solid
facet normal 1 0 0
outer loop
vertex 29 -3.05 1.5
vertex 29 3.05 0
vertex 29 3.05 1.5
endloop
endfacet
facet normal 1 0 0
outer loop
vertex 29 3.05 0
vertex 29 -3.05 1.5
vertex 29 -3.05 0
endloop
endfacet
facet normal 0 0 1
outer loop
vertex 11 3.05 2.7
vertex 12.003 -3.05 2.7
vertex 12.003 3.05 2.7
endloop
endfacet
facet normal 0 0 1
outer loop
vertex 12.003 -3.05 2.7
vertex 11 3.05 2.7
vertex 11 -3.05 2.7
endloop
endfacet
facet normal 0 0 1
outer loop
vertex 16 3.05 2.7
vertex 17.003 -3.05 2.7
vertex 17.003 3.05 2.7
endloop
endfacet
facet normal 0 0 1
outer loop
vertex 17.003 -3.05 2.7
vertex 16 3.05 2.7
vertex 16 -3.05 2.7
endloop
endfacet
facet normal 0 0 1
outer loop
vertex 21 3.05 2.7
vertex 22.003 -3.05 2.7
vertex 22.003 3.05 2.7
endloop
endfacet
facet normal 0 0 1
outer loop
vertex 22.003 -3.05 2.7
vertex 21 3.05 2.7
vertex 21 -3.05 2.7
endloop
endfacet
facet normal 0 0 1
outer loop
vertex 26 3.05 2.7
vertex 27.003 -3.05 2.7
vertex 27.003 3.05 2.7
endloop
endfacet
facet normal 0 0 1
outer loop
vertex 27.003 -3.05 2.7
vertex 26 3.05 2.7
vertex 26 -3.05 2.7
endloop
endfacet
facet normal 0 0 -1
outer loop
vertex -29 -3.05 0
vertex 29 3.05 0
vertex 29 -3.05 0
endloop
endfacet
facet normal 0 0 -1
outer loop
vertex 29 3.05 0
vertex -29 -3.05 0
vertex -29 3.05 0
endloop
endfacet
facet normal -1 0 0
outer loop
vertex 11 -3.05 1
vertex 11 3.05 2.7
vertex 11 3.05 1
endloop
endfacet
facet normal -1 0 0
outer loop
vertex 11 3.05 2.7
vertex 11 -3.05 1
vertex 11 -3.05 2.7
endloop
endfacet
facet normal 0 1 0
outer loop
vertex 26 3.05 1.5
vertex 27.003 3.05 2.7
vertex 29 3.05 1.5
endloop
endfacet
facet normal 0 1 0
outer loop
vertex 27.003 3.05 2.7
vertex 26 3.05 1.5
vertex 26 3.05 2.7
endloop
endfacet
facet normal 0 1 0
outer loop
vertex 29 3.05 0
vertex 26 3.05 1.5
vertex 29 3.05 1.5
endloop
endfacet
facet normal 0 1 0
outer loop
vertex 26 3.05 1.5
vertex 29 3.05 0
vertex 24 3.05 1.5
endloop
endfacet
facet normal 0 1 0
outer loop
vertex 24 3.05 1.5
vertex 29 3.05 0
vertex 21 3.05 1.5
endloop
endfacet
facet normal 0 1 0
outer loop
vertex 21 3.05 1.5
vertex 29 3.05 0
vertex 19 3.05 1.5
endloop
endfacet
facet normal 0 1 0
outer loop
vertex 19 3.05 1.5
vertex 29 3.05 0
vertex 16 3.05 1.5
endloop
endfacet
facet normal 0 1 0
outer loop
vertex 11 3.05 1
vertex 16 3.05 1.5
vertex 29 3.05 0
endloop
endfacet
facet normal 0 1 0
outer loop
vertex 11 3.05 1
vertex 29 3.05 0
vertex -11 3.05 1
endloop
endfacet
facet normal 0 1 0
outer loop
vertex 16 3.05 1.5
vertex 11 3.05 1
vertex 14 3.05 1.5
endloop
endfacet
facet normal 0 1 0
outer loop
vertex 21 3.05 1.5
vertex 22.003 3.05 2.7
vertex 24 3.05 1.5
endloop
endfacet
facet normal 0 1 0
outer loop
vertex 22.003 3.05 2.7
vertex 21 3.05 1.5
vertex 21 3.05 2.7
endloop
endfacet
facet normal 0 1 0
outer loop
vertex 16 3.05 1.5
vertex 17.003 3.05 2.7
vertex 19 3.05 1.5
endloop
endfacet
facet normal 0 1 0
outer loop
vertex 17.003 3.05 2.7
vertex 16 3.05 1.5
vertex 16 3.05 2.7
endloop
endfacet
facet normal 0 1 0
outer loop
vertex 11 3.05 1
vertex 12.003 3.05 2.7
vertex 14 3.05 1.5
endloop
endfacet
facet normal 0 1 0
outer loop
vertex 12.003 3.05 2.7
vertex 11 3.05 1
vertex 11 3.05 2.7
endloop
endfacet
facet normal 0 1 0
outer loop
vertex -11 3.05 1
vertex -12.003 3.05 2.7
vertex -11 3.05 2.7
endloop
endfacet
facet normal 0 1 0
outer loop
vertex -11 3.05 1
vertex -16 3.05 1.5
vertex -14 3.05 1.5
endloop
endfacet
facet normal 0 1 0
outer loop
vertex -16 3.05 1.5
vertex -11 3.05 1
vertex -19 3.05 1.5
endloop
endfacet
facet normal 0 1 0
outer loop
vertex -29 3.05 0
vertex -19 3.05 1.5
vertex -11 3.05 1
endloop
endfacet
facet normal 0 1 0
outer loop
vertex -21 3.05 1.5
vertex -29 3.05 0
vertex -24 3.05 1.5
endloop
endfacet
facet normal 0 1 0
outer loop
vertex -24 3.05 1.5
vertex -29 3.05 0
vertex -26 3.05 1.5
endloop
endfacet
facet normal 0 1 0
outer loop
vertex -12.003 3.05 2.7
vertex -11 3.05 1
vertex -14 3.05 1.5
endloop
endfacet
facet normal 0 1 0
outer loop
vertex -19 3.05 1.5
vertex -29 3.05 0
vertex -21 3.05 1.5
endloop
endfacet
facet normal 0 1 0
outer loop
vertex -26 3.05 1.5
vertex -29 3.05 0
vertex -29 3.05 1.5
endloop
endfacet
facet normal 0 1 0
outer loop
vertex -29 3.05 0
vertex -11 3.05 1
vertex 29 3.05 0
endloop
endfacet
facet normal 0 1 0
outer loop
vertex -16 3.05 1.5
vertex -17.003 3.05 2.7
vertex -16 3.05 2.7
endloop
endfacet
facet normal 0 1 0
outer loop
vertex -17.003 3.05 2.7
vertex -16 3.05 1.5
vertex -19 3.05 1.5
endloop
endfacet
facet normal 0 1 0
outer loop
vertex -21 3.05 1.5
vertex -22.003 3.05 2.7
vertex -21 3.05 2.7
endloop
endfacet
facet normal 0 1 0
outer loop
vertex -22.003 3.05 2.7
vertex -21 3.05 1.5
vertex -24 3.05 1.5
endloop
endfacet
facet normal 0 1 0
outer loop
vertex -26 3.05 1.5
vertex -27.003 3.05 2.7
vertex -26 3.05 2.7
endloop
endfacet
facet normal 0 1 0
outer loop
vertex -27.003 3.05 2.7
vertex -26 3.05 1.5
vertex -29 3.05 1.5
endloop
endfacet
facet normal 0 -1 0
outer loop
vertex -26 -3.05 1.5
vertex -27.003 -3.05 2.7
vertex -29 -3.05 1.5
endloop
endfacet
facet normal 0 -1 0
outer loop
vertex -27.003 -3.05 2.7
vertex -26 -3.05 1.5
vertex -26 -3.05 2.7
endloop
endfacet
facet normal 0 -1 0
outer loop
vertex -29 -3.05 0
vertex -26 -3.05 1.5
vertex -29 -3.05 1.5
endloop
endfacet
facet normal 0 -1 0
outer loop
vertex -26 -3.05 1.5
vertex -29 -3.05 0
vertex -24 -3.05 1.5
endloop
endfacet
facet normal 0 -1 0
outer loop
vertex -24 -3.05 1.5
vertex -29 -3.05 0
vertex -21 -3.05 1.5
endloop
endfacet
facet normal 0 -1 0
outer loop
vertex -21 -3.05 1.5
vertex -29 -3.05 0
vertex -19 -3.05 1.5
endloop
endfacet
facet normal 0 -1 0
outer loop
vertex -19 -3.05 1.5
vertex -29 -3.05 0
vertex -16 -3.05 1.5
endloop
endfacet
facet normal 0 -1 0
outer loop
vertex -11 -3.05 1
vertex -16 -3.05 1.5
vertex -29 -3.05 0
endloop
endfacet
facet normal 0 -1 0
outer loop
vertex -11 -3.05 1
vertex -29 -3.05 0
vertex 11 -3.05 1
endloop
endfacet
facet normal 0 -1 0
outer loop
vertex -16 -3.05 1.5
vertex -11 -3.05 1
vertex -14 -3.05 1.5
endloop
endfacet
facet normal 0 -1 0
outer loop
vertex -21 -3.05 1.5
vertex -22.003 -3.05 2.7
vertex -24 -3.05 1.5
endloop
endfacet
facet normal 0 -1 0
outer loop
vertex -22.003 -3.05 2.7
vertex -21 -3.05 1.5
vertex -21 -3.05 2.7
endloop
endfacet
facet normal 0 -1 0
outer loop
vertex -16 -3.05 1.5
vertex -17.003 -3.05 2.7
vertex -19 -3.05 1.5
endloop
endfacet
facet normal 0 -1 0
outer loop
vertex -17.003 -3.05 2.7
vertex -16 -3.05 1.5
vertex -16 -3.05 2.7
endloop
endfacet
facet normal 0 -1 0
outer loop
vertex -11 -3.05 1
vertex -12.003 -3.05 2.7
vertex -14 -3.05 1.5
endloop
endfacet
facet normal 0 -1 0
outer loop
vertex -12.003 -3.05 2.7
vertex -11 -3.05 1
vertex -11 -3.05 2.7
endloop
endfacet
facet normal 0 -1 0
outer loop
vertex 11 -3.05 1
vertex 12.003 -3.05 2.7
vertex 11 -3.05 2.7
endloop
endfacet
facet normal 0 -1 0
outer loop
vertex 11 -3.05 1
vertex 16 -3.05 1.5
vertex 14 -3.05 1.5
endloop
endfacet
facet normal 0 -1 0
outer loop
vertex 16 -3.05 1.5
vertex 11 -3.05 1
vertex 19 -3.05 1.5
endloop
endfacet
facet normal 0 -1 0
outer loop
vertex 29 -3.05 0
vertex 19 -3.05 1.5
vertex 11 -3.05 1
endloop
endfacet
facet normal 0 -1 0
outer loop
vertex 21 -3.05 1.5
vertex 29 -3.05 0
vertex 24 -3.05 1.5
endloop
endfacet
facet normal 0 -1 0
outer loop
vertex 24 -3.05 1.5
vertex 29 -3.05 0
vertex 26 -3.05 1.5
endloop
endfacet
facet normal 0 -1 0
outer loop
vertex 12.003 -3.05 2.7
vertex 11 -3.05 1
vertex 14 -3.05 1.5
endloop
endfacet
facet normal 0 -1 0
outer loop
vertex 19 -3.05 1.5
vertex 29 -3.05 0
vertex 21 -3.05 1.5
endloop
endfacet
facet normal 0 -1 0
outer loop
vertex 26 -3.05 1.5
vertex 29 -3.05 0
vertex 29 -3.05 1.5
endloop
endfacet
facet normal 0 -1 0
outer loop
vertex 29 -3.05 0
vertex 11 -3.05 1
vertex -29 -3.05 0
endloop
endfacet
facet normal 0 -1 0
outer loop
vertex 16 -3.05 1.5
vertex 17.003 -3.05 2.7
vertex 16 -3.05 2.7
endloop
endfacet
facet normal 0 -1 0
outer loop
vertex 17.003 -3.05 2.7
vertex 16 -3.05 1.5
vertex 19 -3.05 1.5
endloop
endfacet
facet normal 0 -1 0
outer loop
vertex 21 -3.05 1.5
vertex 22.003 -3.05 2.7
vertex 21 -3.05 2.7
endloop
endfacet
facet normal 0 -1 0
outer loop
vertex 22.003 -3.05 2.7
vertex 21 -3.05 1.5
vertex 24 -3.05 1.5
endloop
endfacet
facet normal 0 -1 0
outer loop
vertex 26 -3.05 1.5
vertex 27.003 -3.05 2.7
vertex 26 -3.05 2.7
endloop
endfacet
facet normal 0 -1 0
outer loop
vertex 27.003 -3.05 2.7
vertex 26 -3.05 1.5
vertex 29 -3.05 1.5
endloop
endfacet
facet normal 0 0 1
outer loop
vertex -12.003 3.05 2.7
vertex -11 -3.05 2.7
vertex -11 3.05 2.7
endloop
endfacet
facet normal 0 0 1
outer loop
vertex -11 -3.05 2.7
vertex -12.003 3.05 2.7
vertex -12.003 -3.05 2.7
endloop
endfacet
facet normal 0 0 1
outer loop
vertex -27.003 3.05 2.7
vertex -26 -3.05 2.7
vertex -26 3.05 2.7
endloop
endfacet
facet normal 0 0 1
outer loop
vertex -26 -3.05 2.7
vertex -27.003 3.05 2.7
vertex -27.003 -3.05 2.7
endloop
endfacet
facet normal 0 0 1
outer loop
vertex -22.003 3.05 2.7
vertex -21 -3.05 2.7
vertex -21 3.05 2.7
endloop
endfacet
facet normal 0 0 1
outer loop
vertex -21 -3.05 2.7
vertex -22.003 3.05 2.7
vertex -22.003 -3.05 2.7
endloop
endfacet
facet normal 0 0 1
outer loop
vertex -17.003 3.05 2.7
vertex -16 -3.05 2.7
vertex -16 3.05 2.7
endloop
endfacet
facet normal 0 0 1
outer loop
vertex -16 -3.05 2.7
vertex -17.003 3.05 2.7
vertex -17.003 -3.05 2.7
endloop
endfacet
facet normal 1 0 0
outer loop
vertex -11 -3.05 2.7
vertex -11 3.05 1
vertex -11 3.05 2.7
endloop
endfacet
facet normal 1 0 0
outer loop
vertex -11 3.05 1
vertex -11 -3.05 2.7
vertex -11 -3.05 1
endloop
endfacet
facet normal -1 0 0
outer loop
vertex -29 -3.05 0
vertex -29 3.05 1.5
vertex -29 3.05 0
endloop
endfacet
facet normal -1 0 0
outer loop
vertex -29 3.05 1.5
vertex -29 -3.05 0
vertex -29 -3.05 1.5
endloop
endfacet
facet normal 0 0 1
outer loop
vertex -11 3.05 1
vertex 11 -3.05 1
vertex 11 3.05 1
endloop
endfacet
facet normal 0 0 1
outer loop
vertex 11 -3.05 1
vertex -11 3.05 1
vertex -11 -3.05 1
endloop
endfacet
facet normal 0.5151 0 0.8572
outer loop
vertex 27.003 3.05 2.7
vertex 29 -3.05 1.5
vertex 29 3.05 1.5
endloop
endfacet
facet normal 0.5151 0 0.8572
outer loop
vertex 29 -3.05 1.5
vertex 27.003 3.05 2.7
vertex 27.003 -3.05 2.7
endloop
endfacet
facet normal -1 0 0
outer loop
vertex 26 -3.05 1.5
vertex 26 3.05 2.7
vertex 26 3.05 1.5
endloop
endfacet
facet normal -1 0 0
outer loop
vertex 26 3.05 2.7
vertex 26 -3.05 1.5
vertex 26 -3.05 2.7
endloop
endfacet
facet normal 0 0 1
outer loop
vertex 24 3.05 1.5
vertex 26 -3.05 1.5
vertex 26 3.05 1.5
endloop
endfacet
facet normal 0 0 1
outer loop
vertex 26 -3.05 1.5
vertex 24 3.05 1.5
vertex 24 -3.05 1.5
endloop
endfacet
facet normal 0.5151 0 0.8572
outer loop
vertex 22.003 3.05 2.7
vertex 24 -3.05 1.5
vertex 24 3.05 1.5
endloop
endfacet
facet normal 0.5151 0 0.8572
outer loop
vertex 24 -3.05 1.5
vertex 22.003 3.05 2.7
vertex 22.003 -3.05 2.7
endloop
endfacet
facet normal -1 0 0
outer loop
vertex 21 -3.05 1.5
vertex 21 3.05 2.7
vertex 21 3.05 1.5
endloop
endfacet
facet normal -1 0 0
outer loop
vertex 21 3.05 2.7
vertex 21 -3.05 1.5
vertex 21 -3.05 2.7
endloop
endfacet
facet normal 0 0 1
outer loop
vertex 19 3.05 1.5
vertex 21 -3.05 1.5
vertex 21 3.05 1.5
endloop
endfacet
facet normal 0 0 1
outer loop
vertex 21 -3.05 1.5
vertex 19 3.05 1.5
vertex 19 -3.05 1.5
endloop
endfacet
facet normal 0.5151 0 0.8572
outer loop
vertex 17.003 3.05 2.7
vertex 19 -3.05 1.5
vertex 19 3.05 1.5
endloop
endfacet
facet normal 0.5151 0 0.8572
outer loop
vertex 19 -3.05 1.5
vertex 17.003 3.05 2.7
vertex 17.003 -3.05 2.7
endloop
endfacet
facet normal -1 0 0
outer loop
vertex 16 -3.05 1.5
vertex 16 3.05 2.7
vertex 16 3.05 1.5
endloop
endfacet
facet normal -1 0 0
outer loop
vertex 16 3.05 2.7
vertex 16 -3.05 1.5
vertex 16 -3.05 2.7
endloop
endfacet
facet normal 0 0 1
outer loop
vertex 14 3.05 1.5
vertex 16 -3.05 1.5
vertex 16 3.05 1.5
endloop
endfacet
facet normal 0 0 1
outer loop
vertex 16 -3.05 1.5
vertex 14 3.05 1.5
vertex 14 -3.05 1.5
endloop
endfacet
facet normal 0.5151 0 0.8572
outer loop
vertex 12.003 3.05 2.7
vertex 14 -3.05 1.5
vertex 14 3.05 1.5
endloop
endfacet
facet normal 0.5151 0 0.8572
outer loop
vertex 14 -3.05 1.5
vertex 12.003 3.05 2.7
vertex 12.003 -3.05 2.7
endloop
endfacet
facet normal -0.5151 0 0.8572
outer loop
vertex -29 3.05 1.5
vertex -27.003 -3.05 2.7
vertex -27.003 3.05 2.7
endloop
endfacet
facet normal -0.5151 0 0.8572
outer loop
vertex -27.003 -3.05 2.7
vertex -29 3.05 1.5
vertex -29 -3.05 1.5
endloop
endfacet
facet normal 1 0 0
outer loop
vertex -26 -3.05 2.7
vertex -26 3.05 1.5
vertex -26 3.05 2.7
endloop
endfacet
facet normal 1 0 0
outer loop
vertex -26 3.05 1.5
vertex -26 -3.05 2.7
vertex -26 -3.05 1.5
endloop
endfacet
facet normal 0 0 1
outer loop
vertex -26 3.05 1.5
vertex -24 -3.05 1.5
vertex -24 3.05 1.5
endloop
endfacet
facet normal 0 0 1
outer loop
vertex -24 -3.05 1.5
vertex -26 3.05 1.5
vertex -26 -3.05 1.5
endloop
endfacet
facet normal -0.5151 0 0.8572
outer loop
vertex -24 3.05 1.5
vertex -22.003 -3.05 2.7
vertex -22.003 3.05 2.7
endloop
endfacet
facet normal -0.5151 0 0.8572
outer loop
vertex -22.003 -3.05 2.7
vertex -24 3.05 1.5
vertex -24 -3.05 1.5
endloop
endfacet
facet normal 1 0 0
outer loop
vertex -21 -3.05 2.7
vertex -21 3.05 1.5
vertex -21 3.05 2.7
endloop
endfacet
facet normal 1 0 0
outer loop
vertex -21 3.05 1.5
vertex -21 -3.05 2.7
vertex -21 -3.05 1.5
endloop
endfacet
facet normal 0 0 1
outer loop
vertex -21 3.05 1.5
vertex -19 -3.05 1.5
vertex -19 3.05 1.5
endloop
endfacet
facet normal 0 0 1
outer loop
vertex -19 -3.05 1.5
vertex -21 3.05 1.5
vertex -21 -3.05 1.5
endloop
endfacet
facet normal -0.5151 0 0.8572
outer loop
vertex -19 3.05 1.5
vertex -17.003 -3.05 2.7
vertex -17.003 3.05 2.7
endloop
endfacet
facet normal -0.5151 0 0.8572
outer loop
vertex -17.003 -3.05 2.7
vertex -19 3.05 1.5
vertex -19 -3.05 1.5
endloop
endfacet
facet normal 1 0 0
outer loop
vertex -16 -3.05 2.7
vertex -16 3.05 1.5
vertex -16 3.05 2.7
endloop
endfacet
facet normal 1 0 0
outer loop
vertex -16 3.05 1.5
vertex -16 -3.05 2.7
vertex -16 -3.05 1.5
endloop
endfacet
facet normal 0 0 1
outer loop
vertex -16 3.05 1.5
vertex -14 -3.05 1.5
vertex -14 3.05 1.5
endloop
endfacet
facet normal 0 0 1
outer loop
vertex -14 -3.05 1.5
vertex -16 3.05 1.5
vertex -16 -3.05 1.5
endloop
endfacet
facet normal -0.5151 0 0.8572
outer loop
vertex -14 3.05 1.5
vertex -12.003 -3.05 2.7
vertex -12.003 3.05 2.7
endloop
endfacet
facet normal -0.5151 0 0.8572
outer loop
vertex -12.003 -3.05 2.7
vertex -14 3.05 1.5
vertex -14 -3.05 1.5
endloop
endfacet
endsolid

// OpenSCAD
//length of whole
a = 58.0;

//width of whole
b =  6.1;

//middle part thickness
c =  1.0;

//length of middle section
d = 18.0;

//tap valley thickness
e =  1.5;

//height of taps
f =  2.7;


difference() {
	union() {
		translate([0, 0, c/2])
		cube([a, b, c], center=true);
		
		for(m = [0, 1])
		mirror([m, 0, 0])
		translate([a/2-d/2, 0, f/2])
		cube([d, b, f], center=true);
	} //union
	
	for(m = [0, 1])
	mirror([m, 0, 0])
	for(g = [0, 5, 10, 15])
	translate([a/2-g, 0, 0])
	union() {
		translate([0, -b/2-1, f-(f-e)])
		cube([2, b+2, f-e+1], center=false);
		
		translate([0, -b/2-1, f-(f-e)])
		rotate([0, -59, 0])
		cube([2, b+2, 10], center=false);
	}
}
